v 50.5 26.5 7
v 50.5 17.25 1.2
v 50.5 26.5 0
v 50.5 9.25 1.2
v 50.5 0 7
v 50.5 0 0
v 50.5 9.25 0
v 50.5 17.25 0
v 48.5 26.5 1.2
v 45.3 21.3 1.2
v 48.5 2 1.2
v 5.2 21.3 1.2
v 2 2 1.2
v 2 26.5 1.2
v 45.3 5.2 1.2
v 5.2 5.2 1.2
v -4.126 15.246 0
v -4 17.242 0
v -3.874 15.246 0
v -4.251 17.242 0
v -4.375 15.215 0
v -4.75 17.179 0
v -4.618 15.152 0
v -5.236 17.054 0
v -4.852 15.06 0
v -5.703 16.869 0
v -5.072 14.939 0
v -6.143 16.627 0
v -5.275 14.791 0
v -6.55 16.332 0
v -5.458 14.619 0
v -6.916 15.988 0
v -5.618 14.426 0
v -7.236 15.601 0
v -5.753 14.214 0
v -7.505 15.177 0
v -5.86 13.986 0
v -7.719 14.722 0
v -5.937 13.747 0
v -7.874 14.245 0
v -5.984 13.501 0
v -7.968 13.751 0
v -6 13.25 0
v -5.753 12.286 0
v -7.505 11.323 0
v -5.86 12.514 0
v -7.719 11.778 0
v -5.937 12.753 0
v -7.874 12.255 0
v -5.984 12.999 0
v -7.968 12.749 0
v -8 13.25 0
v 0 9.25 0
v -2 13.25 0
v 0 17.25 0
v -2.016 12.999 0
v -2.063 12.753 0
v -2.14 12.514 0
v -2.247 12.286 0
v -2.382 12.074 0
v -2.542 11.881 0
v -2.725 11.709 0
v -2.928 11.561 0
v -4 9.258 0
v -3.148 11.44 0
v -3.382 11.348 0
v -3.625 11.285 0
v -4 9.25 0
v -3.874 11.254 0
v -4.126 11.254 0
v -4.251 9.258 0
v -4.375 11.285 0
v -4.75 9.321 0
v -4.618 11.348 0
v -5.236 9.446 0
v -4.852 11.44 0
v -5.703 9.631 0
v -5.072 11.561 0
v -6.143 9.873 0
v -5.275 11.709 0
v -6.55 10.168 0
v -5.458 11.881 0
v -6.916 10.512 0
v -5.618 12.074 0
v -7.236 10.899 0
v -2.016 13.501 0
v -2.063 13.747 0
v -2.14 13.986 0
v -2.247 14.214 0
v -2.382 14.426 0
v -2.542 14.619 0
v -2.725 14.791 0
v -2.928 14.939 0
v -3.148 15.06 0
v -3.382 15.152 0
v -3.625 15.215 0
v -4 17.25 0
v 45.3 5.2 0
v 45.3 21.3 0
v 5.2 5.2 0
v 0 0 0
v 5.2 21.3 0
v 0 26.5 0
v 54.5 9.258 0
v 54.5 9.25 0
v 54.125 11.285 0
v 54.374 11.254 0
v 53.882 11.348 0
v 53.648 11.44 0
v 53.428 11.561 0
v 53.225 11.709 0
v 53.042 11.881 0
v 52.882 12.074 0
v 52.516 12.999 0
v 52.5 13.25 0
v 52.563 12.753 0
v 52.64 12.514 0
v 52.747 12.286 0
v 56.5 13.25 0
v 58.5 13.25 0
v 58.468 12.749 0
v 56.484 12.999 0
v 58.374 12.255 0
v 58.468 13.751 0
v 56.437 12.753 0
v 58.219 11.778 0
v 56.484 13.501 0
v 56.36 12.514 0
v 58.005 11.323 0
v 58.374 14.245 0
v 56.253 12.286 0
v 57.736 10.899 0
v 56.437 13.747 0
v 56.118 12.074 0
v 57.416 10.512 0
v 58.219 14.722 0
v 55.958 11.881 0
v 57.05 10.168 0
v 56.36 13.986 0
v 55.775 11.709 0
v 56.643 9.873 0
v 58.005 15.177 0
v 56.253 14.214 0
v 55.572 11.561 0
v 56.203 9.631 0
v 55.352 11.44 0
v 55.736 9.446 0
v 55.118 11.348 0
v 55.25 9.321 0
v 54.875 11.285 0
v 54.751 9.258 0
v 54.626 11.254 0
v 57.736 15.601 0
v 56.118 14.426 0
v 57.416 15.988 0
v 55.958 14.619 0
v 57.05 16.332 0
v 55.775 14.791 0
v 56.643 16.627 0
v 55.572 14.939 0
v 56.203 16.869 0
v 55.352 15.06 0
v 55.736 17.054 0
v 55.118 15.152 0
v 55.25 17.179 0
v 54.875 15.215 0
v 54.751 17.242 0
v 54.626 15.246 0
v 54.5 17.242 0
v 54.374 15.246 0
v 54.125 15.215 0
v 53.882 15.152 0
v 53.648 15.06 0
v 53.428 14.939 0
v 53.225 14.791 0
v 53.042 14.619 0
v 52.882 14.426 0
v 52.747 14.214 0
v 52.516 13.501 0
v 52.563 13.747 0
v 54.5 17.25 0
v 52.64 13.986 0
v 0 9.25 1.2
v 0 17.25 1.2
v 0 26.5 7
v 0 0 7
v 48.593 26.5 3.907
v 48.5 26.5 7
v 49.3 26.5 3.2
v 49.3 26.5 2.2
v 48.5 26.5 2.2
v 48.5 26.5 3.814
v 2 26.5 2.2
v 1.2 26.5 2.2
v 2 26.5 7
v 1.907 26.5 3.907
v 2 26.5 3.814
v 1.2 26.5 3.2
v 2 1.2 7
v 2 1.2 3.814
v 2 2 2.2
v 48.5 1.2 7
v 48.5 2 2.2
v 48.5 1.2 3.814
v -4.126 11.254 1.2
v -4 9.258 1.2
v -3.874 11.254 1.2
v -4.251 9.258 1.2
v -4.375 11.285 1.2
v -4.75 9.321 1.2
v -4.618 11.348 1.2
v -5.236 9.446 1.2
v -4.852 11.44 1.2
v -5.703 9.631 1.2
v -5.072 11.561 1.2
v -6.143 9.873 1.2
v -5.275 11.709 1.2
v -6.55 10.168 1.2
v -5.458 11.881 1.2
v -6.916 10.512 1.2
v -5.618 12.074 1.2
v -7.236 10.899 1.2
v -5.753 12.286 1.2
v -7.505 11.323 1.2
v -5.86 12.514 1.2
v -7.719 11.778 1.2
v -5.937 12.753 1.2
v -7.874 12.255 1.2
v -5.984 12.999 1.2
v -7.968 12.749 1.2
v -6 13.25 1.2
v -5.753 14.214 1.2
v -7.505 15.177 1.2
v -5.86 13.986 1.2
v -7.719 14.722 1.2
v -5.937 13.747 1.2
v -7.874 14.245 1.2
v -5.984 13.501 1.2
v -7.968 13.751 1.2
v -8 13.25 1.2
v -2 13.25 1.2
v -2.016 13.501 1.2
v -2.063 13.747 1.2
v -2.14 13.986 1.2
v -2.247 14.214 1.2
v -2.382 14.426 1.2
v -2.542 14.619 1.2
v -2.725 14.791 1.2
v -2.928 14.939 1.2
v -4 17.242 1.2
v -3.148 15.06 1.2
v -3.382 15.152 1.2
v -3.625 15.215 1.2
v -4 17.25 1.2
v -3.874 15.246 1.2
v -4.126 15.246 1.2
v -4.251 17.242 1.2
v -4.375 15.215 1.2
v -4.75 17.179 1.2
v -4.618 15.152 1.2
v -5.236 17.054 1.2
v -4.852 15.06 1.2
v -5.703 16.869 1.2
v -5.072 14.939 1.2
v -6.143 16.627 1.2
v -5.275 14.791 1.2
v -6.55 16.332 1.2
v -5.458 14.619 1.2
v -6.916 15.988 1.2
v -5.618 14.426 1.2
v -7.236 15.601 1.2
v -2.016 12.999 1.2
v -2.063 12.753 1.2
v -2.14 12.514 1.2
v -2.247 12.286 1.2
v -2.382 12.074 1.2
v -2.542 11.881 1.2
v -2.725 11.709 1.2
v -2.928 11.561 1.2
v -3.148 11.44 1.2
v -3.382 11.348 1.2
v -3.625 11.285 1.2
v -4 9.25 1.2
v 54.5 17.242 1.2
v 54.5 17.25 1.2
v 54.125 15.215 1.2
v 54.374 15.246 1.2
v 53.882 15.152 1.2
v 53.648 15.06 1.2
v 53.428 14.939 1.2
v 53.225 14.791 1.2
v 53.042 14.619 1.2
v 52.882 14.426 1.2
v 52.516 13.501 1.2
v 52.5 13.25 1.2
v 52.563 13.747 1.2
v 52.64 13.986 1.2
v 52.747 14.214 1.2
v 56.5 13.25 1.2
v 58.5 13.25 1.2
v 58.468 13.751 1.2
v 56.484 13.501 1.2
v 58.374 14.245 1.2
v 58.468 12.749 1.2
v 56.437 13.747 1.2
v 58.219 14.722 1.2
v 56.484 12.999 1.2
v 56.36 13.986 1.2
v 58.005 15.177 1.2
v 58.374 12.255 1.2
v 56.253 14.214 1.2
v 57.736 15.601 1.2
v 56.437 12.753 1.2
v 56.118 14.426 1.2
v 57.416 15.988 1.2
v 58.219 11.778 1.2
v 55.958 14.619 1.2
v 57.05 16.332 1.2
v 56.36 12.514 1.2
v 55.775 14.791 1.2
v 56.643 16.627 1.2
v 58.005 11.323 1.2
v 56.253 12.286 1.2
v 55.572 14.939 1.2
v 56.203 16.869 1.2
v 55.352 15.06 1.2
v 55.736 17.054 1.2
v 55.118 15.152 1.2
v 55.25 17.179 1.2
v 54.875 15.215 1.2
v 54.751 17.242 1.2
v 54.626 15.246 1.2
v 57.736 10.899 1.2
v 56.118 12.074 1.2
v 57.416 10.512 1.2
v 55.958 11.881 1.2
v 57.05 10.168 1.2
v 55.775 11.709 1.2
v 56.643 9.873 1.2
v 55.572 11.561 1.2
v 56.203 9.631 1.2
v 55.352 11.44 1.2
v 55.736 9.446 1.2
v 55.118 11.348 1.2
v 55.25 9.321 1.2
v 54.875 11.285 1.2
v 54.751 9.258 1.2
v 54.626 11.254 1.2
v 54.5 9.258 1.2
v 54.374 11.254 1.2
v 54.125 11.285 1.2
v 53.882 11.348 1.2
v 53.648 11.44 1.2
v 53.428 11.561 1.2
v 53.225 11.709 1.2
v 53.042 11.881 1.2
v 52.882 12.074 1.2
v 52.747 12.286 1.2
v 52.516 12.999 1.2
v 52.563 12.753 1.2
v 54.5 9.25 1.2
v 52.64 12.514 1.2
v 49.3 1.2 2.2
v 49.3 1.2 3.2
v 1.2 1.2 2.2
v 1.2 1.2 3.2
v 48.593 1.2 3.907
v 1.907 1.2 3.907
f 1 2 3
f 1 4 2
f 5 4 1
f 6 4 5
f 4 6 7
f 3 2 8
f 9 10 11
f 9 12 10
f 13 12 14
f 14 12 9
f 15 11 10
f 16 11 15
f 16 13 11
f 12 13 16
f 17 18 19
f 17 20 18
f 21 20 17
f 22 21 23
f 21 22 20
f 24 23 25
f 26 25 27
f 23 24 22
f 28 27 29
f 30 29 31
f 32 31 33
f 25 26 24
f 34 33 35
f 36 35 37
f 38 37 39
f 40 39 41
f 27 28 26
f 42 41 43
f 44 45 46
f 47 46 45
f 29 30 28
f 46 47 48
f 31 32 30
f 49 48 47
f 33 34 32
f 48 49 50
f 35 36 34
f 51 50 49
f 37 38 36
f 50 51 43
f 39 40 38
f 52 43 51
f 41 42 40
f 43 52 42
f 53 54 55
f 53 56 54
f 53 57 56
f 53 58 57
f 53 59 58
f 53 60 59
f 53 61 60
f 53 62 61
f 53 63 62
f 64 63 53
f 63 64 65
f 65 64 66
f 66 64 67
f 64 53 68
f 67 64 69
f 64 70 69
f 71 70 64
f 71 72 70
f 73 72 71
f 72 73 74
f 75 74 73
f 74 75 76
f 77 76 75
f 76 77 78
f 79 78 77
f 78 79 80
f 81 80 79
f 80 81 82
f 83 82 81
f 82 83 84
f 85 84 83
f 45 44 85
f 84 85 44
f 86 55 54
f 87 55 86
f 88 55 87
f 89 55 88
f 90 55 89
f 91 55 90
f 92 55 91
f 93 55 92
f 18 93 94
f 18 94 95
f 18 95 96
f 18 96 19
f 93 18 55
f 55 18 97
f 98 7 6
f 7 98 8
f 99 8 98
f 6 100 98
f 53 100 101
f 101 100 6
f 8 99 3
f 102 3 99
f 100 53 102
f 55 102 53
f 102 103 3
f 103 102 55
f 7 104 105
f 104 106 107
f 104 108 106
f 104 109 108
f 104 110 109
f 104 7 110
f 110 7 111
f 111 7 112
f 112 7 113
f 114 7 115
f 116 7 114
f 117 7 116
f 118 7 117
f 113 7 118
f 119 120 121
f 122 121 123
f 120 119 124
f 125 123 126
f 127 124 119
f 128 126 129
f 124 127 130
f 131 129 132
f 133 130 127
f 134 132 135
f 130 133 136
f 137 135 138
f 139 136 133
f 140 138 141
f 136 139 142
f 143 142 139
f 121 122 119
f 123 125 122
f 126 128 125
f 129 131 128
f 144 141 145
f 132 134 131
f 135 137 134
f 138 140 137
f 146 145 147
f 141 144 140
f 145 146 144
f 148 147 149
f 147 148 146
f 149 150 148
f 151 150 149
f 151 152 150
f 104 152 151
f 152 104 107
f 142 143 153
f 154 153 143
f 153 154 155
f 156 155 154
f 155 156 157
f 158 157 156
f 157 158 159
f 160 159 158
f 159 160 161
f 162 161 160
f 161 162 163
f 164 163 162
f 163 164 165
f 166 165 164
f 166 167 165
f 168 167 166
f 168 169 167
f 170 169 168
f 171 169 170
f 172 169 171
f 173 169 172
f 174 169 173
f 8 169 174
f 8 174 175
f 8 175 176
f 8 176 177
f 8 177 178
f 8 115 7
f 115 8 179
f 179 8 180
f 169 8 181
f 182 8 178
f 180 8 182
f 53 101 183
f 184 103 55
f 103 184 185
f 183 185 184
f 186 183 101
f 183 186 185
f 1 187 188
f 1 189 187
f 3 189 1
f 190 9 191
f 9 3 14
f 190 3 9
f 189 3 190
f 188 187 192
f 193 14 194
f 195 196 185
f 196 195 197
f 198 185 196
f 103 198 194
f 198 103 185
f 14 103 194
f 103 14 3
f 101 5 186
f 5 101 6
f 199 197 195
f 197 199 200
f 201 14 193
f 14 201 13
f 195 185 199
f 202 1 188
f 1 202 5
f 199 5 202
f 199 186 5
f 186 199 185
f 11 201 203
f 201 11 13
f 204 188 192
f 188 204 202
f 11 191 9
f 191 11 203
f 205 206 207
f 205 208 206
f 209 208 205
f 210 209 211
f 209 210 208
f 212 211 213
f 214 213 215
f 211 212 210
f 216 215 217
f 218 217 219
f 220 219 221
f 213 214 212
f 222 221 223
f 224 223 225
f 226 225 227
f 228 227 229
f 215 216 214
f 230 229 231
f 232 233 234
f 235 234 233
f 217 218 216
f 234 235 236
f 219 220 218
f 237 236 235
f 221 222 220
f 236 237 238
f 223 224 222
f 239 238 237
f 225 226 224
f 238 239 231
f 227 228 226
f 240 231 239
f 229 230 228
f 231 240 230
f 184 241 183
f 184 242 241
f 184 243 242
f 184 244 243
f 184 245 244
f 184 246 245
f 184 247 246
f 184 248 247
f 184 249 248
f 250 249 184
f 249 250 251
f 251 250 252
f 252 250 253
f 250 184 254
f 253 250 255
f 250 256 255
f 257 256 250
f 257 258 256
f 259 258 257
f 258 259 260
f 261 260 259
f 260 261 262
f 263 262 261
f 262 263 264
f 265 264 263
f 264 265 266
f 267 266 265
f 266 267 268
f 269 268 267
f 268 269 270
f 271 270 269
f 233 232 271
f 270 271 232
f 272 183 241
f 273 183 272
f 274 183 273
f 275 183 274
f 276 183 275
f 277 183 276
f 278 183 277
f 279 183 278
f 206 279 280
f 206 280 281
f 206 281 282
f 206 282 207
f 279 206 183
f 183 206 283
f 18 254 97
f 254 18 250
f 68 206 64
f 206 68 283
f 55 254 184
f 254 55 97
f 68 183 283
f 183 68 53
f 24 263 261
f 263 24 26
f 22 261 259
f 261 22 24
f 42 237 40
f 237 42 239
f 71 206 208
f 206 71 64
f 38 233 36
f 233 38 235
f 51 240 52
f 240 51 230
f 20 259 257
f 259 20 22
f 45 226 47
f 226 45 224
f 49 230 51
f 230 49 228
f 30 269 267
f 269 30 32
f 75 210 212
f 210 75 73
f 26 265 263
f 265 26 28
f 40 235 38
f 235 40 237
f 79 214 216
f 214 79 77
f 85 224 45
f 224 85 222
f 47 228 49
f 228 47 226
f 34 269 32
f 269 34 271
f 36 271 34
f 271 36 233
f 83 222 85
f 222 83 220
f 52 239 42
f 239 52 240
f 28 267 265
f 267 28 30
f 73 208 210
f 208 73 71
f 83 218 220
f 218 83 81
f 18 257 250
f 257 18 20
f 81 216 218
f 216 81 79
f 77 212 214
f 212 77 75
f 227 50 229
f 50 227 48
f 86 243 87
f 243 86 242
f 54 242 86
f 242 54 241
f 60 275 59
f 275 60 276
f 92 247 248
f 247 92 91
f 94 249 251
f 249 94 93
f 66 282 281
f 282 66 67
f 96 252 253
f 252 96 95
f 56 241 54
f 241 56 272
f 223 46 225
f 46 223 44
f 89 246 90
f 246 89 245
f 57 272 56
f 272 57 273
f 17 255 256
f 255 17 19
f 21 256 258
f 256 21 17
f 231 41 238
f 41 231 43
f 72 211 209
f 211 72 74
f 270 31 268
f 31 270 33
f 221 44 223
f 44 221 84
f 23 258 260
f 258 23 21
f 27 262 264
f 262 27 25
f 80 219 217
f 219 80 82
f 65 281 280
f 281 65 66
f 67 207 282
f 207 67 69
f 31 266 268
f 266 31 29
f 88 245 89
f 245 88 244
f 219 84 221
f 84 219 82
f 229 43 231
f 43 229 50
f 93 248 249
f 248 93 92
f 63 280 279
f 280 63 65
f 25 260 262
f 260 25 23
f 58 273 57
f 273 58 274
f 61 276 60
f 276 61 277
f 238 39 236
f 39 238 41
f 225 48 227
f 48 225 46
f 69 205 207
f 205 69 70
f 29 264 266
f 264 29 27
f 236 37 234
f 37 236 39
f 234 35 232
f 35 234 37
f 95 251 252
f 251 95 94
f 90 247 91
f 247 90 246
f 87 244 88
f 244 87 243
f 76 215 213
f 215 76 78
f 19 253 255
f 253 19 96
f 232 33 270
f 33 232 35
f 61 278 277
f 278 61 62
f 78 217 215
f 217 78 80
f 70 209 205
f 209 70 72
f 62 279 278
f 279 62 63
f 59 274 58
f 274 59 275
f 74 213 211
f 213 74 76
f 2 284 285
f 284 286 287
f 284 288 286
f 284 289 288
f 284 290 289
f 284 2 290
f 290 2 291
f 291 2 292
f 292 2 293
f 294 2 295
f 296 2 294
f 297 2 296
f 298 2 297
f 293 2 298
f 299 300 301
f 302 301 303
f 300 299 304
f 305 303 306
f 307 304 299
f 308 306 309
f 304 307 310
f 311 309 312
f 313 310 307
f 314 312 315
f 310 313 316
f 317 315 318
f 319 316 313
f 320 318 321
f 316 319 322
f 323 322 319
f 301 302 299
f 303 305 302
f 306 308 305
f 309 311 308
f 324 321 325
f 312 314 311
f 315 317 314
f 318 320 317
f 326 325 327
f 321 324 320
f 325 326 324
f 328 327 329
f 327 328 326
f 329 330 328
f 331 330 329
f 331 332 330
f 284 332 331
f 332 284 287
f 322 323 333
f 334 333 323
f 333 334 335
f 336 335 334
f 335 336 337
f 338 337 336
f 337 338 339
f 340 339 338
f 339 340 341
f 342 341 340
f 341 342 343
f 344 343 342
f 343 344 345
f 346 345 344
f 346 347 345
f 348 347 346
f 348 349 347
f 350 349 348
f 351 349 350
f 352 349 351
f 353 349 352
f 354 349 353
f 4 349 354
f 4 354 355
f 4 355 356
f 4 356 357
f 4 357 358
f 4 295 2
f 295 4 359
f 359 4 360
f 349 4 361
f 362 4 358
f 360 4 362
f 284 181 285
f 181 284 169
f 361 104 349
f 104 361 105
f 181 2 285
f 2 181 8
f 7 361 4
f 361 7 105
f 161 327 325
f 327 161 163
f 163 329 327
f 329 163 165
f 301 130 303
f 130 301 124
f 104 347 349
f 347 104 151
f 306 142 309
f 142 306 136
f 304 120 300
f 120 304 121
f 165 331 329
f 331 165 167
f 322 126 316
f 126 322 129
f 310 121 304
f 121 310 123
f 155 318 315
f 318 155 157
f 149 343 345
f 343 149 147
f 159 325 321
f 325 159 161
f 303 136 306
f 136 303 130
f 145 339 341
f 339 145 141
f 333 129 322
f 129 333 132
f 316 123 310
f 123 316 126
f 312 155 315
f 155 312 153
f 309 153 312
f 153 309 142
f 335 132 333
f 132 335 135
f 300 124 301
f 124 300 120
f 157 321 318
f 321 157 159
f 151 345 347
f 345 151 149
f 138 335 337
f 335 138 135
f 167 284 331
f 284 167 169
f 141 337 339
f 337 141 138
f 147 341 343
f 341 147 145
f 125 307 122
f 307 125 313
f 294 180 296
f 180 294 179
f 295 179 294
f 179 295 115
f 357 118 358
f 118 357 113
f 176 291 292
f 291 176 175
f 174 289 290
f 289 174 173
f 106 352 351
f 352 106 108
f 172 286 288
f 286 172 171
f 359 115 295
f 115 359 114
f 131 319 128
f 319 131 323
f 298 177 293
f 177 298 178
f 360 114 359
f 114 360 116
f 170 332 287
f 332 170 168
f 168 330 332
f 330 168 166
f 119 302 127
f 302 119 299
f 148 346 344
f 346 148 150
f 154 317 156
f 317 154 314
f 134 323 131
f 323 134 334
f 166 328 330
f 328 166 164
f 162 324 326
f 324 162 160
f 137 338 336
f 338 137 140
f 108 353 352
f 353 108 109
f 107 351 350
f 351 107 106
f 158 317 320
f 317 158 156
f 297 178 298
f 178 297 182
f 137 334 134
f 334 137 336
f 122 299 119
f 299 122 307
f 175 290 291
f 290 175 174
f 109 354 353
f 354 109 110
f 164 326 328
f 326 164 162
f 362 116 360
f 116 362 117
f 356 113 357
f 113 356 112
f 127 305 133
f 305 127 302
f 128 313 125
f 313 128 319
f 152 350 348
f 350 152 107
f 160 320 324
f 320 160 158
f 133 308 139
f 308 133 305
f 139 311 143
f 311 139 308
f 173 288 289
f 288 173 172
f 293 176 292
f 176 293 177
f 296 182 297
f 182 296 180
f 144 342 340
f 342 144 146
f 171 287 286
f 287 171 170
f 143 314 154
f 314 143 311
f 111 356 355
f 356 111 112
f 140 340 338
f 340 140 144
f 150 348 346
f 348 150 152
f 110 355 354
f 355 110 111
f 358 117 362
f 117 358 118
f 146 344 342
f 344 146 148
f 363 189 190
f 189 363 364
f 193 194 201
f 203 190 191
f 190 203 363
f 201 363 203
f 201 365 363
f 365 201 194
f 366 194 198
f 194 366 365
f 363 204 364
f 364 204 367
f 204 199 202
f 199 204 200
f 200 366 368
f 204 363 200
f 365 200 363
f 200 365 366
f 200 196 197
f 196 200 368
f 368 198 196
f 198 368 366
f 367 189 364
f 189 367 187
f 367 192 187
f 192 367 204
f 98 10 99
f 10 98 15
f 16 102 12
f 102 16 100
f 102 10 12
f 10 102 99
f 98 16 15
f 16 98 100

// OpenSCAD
// for led power module modified

/* bluetooth_mate_holder.scad
 * By John Biehler - November 17, 2011
 * http://www.thingiverse.com/thing: 

 * derived from pcb_box_slide_with_tabs.scad
 * By Nicholas C Lewis - Jan 1, 2011
 * http://www.thingiverse.com/thing:5396 
 *
 * derived from pcb_box_slide.scad 
 *     Parametric, open PCB-box (slide-in) by chlunde
 *     http://www.thingiverse.com/thing:4071
 *
 * CHANGES
 * - adjusted to fit Arduino Mega
 * - added mounting tabs
 * - turned off cutouts
 * - adjusted bottom cutout size
 */

$fn=50;

//Uno is 2.7" x 2.1" which is 68.58 mm x 53.34 mm
//Round up to 69 mm x 54 mm
pcb_width = 48.1;
pcb_length =24.1;
pcb_height =1.0;
slisse = 0.8;

pcb_bottom_margin = 1;
wall_width_thick = 2;
wall_width = wall_width_thick-slisse;
box_height = 7;

//tab parameters
tab_hole_radius=2;
tab_outer_radius=4;

inner_margin = 4;

module pcb_led_cvf() {


  difference() {
    box();
    pcb();
    holes();
  }


}

module tab() {
	difference(){
		union() {
			translate([-tab_outer_radius,-tab_outer_radius,0])
			cube([tab_outer_radius,2*tab_outer_radius,wall_width]);
			translate([-tab_outer_radius,0,0])
				cylinder(r=tab_outer_radius, h = wall_width);
		}
		translate([-tab_outer_radius,0,0])
		 cylinder(r= tab_hole_radius, h = wall_width+3,center=true);
	}

}

module box() {
  union() {
    cube([pcb_width + 2*wall_width, pcb_length + 2*wall_width, wall_width]);

    cube([wall_width_thick, pcb_length + 2*wall_width, box_height]);

    cube([pcb_width + 2*wall_width, wall_width_thick, box_height]);

    %translate([0, pcb_length+wall_width, 0])
      cube([pcb_width + 2*wall_width,wall_width,box_height]);

    translate([pcb_width + wall_width - slisse,0,0])
      cube([wall_width_thick, pcb_length + 2*wall_width, box_height]);
  }
//comment out this part to remove tabs
 for(i=[(pcb_length + 2*wall_width)/2]){
	translate([0,i,0])tab();
	translate([pcb_width + 2*wall_width,i,0])mirror()tab();
 }


}

module pcb() {
  translate([wall_width, wall_width, wall_width + pcb_bottom_margin])
    cube([pcb_width,pcb_length + wall_width + 0.1,pcb_height]);
  translate([wall_width, wall_width, wall_width + pcb_bottom_margin+pcb_height])rotate([0,45,0])
    cube([pcb_height,pcb_length + wall_width + 0.1,pcb_height]);
  translate([wall_width+pcb_width-2*cos(45)*pcb_height, wall_width, wall_width + pcb_bottom_margin+pcb_height])rotate([0,45,0])
    cube([pcb_height,pcb_length + wall_width + 0.1,pcb_height]);
  translate([wall_width_thick, wall_width, wall_width + pcb_bottom_margin])
    cube([pcb_width-2*slisse,pcb_length + wall_width + 0.1,box_height]);

}



module holes() {
    *translate([wall_width + pcb_width/2, wall_width_thick + 0.1, pcb_width/2+wall_width])
      rotate(a=90,v=[1,0,0])
        cylinder(r=pcb_width/2, h=wall_width_thick + 0.2);
  
    *translate([-0.1, wall_width + pcb_length/2, pcb_length/2 + wall_width])
      rotate(a=90,v=[0,1,0])
        cylinder(r=pcb_length/2, h=wall_width_thick + 0.2);
  
    *translate([pcb_width + wall_width - slisse - 0.1, wall_width + pcb_length/2, pcb_length/2 + wall_width])
      rotate(a=90,v=[0,1,0])
        cylinder(r=pcb_length/2, h=wall_width_thick + 0.2);
  
   * translate([pcb_width/2 + wall_width, wall_width + pcb_length/2, -0.1])
      rotate(a=0,v=[0,1,0])
        cylinder(r=min(pcb_length,pcb_width)/2 - wall_width/2, h=wall_width_thick + 0.2);
     
    translate([inner_margin +wall_width, inner_margin+wall_width, -0.1])
      cube([pcb_width-inner_margin*2,pcb_length -inner_margin*2,wall_width + 0.2]);
}


pcb_led_cvf();
